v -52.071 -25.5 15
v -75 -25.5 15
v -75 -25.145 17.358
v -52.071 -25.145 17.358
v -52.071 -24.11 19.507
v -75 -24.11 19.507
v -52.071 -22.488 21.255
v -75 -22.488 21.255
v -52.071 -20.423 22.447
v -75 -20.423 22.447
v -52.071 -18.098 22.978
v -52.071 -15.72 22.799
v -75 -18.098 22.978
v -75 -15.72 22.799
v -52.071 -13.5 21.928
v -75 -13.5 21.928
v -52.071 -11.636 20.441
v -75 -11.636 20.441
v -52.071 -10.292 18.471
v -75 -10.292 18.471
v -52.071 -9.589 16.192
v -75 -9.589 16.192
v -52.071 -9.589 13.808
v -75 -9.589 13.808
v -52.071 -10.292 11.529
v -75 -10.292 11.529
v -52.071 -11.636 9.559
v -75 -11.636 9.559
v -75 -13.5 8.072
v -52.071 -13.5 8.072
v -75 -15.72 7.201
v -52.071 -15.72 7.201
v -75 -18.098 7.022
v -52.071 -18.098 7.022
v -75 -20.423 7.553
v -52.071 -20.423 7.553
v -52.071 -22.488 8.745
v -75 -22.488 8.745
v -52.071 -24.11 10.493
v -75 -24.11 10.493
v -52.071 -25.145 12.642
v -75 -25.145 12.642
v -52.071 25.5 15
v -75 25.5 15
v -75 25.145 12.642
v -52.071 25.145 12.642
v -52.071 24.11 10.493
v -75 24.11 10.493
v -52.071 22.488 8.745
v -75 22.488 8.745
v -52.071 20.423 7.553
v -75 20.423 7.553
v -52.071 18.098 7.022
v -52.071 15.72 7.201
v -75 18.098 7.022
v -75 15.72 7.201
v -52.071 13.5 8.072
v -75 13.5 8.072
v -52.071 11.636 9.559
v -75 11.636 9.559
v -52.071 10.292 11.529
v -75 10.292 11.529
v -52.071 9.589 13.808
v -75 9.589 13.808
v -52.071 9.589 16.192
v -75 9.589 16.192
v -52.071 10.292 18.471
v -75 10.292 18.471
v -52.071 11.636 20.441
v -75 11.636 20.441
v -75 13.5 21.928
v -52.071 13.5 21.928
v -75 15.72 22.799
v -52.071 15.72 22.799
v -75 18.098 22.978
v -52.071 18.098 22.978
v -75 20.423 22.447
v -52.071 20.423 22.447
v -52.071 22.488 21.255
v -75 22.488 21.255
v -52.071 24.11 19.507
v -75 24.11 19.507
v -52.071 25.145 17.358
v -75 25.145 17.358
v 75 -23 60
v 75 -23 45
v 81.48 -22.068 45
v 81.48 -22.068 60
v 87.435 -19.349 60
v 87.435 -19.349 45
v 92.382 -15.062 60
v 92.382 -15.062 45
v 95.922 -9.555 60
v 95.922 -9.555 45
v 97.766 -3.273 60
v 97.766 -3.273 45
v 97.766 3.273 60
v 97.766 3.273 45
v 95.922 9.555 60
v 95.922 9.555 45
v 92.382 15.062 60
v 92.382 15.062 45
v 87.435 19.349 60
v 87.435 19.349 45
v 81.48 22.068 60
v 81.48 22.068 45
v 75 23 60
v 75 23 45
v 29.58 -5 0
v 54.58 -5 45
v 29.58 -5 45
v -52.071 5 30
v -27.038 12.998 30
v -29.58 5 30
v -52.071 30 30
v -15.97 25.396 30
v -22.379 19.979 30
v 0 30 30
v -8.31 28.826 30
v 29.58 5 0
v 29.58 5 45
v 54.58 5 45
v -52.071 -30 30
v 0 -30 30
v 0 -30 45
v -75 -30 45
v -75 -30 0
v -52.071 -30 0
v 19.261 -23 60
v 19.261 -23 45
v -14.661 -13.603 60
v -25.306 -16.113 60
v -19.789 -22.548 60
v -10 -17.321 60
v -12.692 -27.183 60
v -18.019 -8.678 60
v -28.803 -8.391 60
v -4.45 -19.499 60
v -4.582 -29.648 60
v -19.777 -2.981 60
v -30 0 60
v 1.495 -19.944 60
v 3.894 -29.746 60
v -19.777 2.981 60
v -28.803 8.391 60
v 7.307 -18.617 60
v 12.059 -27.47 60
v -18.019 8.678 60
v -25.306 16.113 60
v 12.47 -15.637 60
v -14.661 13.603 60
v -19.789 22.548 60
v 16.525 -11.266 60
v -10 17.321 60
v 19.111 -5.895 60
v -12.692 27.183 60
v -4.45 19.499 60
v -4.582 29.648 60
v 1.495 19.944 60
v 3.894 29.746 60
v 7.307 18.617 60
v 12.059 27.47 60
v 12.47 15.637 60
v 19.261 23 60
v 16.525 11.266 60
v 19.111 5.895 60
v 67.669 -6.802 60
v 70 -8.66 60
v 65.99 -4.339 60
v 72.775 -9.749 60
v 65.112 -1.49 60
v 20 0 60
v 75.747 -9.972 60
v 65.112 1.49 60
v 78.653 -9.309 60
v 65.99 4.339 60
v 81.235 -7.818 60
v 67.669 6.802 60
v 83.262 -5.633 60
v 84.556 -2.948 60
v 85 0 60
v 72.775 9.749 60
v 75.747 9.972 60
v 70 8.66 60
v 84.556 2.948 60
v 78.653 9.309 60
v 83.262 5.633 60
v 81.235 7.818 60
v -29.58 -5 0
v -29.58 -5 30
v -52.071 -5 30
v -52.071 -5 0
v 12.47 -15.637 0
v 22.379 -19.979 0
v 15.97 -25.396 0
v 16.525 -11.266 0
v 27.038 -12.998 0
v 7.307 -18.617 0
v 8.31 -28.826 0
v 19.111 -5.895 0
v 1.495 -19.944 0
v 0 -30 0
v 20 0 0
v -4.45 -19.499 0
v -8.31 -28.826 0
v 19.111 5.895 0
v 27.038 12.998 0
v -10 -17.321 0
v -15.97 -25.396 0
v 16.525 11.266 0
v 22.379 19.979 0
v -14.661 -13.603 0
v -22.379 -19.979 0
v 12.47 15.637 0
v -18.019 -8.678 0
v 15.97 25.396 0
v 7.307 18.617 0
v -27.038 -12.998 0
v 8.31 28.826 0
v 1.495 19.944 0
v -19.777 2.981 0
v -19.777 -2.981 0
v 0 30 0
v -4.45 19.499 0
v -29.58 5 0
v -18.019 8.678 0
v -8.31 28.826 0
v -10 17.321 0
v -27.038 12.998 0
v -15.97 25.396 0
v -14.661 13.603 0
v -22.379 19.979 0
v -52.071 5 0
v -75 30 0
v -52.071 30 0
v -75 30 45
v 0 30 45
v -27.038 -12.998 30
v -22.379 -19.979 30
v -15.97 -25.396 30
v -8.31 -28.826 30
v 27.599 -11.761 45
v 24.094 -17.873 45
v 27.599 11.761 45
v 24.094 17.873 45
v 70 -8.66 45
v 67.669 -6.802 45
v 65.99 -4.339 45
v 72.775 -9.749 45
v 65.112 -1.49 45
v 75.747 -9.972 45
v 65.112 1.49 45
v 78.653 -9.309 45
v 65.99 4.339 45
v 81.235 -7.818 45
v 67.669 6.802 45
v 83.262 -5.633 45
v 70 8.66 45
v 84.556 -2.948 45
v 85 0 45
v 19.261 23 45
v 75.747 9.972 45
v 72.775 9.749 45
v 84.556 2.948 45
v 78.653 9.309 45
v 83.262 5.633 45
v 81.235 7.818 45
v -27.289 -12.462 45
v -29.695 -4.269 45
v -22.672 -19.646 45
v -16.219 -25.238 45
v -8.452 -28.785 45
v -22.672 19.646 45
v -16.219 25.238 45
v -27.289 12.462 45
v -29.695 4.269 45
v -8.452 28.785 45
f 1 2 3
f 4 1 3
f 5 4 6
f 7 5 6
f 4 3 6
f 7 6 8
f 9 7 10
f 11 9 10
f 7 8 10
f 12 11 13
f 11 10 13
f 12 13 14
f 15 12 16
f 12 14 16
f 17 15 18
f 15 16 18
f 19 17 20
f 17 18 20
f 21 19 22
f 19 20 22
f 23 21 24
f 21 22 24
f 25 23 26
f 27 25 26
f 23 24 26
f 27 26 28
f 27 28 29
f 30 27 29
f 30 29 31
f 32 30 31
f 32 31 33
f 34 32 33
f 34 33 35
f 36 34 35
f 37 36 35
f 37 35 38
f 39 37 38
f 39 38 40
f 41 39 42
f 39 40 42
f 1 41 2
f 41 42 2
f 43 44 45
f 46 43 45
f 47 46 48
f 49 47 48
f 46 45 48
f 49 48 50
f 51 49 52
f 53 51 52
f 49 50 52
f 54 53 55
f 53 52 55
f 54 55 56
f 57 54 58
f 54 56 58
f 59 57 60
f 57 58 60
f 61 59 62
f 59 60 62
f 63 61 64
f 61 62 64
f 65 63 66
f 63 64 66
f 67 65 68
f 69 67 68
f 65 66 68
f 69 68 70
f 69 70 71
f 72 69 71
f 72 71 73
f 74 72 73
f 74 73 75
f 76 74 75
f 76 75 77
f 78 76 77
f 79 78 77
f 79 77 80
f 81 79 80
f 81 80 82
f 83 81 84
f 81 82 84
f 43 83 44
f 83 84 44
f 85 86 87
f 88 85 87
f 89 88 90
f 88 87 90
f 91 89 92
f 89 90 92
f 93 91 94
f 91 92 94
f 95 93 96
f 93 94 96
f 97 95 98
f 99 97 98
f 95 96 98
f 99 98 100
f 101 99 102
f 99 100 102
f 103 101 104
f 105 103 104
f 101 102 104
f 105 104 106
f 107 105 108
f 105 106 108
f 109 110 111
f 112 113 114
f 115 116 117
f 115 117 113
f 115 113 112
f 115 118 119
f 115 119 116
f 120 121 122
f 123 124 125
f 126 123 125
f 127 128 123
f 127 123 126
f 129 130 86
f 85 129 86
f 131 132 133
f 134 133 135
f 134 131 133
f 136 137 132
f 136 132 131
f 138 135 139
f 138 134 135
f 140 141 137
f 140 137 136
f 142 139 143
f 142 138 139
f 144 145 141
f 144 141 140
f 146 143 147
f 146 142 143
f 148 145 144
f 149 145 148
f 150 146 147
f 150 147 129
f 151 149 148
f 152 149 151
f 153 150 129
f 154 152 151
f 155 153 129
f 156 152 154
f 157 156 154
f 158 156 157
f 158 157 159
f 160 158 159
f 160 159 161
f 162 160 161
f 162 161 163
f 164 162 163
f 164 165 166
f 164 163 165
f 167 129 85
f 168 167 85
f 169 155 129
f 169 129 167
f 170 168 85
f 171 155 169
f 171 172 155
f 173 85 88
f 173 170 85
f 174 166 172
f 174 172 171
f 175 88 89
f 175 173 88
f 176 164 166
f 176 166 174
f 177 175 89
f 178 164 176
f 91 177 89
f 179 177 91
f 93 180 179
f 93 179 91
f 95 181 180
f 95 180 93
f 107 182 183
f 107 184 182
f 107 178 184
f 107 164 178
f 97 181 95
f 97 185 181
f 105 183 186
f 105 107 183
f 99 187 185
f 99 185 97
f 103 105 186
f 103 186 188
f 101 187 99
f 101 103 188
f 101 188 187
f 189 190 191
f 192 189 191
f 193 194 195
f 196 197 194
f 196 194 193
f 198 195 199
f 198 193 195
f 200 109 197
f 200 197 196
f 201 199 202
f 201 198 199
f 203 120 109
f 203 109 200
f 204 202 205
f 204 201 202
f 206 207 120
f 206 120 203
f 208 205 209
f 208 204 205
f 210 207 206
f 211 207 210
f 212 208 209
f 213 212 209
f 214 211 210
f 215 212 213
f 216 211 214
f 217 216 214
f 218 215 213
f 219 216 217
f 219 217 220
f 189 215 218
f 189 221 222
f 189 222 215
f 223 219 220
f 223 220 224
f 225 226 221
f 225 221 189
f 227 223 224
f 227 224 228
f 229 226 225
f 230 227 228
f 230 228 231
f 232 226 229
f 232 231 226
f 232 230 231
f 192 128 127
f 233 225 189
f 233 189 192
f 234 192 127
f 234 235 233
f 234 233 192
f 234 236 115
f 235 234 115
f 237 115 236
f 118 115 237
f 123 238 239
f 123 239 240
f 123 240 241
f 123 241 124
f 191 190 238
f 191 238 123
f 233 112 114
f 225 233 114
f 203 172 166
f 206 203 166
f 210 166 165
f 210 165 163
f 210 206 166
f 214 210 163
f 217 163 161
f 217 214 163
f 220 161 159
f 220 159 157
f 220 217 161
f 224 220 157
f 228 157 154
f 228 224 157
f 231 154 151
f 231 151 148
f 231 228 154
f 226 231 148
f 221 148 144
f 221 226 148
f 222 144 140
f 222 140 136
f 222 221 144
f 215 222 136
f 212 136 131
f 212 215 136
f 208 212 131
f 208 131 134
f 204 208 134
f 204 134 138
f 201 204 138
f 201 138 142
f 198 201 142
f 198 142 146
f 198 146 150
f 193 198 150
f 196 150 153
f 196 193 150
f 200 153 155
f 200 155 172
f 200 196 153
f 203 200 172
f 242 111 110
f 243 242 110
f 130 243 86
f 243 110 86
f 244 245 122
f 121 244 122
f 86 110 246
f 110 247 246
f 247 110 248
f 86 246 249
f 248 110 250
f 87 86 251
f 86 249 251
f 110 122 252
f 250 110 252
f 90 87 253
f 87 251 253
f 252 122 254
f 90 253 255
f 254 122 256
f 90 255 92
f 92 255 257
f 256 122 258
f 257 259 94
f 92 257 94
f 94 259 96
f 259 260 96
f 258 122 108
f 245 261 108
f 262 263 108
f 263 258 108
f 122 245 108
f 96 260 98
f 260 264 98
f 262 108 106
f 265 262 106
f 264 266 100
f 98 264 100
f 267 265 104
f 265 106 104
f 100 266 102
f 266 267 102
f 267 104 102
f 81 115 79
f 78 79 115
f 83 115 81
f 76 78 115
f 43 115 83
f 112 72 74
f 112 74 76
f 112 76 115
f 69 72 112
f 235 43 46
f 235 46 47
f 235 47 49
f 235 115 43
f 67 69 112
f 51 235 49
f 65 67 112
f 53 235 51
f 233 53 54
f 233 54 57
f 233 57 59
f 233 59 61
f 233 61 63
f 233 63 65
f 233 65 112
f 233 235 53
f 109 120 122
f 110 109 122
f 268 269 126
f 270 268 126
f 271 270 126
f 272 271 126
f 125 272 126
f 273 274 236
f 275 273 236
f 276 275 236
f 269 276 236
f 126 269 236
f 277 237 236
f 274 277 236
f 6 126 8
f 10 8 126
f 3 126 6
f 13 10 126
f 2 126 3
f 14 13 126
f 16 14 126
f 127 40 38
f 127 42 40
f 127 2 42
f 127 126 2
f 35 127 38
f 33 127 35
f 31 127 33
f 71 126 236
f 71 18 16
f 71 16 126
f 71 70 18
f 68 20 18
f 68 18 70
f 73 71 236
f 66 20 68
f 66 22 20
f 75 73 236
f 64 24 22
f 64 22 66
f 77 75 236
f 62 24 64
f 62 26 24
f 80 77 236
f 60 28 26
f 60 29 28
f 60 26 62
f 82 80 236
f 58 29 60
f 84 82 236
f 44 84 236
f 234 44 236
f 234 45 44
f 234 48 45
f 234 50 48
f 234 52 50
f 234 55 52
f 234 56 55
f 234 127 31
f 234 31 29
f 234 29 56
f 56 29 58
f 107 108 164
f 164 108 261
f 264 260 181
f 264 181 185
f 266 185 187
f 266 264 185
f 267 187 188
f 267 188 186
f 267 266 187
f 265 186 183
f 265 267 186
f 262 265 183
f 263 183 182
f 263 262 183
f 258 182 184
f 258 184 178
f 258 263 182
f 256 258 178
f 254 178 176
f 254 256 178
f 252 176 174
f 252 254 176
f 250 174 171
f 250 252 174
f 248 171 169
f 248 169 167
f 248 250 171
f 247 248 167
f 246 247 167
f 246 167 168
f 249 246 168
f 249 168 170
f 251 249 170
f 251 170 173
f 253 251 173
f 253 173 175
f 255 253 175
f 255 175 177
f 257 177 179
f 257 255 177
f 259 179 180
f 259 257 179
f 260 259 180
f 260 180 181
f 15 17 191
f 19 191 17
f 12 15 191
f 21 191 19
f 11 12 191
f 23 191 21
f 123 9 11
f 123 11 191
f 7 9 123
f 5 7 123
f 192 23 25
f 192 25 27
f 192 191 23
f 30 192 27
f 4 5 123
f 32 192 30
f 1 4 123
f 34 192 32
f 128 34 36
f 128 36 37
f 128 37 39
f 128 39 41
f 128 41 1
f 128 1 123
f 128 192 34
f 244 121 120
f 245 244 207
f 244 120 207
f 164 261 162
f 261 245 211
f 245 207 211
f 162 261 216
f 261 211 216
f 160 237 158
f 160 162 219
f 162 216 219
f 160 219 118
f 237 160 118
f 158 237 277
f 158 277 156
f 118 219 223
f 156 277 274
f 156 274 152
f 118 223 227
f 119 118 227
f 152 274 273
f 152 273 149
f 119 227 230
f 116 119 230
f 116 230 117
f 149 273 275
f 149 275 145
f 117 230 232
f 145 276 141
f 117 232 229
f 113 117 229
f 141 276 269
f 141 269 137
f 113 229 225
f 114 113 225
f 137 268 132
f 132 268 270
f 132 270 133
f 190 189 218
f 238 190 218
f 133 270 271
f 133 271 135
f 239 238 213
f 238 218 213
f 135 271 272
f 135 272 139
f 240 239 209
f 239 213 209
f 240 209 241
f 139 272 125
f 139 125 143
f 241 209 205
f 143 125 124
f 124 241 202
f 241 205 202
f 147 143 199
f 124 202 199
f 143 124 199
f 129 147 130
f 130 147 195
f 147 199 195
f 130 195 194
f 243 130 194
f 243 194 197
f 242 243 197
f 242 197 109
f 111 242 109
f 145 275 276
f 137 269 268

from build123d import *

# Parameters (mm, degrees)
SKETCH1_R           = 30
SKETCH1_R_2         = 20
BOSS_EXTRUDE1_DEPTH = 60
BOSS_EXTRUDE3_START = -15
SKETCH2_R           = 10
BOSS_EXTRUDE3_DEPTH = 15
BOSS_EXTRUDE4_START = -30
BOSS_EXTRUDE4_DEPTH = 15
BOSS_EXTRUDE8_DEPTH = 30
SKETCH9_R           = 8
CUT_EXTRUDE2_DEPTH  = 22.929058222
BOSS_EXTRUDE9_START = 45
BOSS_EXTRUDE9_DEPTH = 45
CUT_EXTRUDE8_DEPTH  = 10


with BuildPart() as part:
    # Sketch1 → Boss-Extrude1 (new body)
    with BuildSketch(Plane.XY):
        Circle(SKETCH1_R)
        Circle(SKETCH1_R_2, mode=Mode.SUBTRACT)
    extrude(amount=BOSS_EXTRUDE1_DEPTH)

    # Sketch2 → Boss-Extrude3 (add)
    with BuildSketch(Plane.XY.offset(60).offset(BOSS_EXTRUDE3_START)):
        with BuildLine():
            Line((75, 23), (19.261360284, 23))
            ThreePointArc((19.261360284, 23), (27.18309041, 12.691713664), (30, 0))
            ThreePointArc((30, 0), (27.18309041, -12.691713664), (19.261360284, -23))
            Line((19.261360284, -23), (75, -23))
            ThreePointArc((75, -23), (98, 0), (75, 23))
        make_face()
        with Locations((75, 0)):
            Circle(SKETCH2_R, mode=Mode.SUBTRACT)
    extrude(amount=BOSS_EXTRUDE3_DEPTH)

    # Sketch3 → Boss-Extrude4 (add)
    with BuildSketch(Plane.XY.offset(60).offset(BOSS_EXTRUDE4_START)):
        with BuildLine():
            Line((0, -30), (-75, -30))
            Line((-75, -30), (-75, 30))
            Line((-75, 30), (0, 30))
            ThreePointArc((0, 30), (-30, 0), (0, -30))
        make_face()
    extrude(amount=BOSS_EXTRUDE4_DEPTH)

    # Sketch5 → Boss-Extrude8 (add)
    with BuildSketch(Plane(origin=(0, 0, 0), x_dir=(-1, 0, 0), z_dir=(0, 0, -1))):
        with BuildLine():
            Line((75, 5), (75, 30))
            Line((75, 30), (52.070941778, 30))
            Line((52.070941778, 30), (52.070941778, 5))
            Line((52.070941778, 5), (29.580398915, 5))
            ThreePointArc((29.580398915, 5), (29.894915684, 2.508787808), (30, 0))
            ThreePointArc((30, 0), (29.894915684, -2.508787808), (29.580398915, -5))
            Line((29.580398915, -5), (52.070941778, -5))
            Line((52.070941778, -5), (52.070941778, -30))
            Line((52.070941778, -30), (75, -30))
            Line((75, -30), (75, -5))
            Line((75, -5), (75, -4.926312307))
            Line((75, -4.926312307), (75, 4.981002017))
            Line((75, 4.981002017), (75, 5))
        make_face()
    extrude(amount=-BOSS_EXTRUDE8_DEPTH)

    # Sketch9 → Cut-Extrude2 (cut)
    with BuildSketch(Plane.ZY.offset(75)):
        with Locations(Location((15, -17.5, 0), (0, 0, 270))):
            Circle(SKETCH9_R)
        with Locations(Location((15, 17.5, 0), (0, 0, 90))):
            Circle(SKETCH9_R)
    extrude(amount=-CUT_EXTRUDE2_DEPTH, mode=Mode.SUBTRACT)

    # Sketch10 → Boss-Extrude9 (add)
    with BuildSketch(Plane(origin=(0, 0, 45), x_dir=(-1, 0, 0), z_dir=(0, 0, -1)).offset(BOSS_EXTRUDE9_START)):
        with BuildLine():
            Line((-29.580398915, 5), (-54.580398915, 5))
            Line((-54.580398915, 5), (-54.580398915, -5))
            Line((-54.580398915, -5), (-29.580398915, -5))
            ThreePointArc((-29.580398915, -5), (-30, 0), (-29.580398915, 5))
        make_face()
    extrude(amount=-BOSS_EXTRUDE9_DEPTH)

    # Sketch11 → Cut-Extrude8 (cut)
    with BuildSketch(Plane(origin=(0, 5, 0), x_dir=(1, 0, 0), z_dir=(0, 1, 0))):
        Polygon((29.580398915, 0), (54.580398915, -45), (54.580398915, 0), align=None)
    extrude(amount=-CUT_EXTRUDE8_DEPTH, mode=Mode.SUBTRACT)


solid = part.part
